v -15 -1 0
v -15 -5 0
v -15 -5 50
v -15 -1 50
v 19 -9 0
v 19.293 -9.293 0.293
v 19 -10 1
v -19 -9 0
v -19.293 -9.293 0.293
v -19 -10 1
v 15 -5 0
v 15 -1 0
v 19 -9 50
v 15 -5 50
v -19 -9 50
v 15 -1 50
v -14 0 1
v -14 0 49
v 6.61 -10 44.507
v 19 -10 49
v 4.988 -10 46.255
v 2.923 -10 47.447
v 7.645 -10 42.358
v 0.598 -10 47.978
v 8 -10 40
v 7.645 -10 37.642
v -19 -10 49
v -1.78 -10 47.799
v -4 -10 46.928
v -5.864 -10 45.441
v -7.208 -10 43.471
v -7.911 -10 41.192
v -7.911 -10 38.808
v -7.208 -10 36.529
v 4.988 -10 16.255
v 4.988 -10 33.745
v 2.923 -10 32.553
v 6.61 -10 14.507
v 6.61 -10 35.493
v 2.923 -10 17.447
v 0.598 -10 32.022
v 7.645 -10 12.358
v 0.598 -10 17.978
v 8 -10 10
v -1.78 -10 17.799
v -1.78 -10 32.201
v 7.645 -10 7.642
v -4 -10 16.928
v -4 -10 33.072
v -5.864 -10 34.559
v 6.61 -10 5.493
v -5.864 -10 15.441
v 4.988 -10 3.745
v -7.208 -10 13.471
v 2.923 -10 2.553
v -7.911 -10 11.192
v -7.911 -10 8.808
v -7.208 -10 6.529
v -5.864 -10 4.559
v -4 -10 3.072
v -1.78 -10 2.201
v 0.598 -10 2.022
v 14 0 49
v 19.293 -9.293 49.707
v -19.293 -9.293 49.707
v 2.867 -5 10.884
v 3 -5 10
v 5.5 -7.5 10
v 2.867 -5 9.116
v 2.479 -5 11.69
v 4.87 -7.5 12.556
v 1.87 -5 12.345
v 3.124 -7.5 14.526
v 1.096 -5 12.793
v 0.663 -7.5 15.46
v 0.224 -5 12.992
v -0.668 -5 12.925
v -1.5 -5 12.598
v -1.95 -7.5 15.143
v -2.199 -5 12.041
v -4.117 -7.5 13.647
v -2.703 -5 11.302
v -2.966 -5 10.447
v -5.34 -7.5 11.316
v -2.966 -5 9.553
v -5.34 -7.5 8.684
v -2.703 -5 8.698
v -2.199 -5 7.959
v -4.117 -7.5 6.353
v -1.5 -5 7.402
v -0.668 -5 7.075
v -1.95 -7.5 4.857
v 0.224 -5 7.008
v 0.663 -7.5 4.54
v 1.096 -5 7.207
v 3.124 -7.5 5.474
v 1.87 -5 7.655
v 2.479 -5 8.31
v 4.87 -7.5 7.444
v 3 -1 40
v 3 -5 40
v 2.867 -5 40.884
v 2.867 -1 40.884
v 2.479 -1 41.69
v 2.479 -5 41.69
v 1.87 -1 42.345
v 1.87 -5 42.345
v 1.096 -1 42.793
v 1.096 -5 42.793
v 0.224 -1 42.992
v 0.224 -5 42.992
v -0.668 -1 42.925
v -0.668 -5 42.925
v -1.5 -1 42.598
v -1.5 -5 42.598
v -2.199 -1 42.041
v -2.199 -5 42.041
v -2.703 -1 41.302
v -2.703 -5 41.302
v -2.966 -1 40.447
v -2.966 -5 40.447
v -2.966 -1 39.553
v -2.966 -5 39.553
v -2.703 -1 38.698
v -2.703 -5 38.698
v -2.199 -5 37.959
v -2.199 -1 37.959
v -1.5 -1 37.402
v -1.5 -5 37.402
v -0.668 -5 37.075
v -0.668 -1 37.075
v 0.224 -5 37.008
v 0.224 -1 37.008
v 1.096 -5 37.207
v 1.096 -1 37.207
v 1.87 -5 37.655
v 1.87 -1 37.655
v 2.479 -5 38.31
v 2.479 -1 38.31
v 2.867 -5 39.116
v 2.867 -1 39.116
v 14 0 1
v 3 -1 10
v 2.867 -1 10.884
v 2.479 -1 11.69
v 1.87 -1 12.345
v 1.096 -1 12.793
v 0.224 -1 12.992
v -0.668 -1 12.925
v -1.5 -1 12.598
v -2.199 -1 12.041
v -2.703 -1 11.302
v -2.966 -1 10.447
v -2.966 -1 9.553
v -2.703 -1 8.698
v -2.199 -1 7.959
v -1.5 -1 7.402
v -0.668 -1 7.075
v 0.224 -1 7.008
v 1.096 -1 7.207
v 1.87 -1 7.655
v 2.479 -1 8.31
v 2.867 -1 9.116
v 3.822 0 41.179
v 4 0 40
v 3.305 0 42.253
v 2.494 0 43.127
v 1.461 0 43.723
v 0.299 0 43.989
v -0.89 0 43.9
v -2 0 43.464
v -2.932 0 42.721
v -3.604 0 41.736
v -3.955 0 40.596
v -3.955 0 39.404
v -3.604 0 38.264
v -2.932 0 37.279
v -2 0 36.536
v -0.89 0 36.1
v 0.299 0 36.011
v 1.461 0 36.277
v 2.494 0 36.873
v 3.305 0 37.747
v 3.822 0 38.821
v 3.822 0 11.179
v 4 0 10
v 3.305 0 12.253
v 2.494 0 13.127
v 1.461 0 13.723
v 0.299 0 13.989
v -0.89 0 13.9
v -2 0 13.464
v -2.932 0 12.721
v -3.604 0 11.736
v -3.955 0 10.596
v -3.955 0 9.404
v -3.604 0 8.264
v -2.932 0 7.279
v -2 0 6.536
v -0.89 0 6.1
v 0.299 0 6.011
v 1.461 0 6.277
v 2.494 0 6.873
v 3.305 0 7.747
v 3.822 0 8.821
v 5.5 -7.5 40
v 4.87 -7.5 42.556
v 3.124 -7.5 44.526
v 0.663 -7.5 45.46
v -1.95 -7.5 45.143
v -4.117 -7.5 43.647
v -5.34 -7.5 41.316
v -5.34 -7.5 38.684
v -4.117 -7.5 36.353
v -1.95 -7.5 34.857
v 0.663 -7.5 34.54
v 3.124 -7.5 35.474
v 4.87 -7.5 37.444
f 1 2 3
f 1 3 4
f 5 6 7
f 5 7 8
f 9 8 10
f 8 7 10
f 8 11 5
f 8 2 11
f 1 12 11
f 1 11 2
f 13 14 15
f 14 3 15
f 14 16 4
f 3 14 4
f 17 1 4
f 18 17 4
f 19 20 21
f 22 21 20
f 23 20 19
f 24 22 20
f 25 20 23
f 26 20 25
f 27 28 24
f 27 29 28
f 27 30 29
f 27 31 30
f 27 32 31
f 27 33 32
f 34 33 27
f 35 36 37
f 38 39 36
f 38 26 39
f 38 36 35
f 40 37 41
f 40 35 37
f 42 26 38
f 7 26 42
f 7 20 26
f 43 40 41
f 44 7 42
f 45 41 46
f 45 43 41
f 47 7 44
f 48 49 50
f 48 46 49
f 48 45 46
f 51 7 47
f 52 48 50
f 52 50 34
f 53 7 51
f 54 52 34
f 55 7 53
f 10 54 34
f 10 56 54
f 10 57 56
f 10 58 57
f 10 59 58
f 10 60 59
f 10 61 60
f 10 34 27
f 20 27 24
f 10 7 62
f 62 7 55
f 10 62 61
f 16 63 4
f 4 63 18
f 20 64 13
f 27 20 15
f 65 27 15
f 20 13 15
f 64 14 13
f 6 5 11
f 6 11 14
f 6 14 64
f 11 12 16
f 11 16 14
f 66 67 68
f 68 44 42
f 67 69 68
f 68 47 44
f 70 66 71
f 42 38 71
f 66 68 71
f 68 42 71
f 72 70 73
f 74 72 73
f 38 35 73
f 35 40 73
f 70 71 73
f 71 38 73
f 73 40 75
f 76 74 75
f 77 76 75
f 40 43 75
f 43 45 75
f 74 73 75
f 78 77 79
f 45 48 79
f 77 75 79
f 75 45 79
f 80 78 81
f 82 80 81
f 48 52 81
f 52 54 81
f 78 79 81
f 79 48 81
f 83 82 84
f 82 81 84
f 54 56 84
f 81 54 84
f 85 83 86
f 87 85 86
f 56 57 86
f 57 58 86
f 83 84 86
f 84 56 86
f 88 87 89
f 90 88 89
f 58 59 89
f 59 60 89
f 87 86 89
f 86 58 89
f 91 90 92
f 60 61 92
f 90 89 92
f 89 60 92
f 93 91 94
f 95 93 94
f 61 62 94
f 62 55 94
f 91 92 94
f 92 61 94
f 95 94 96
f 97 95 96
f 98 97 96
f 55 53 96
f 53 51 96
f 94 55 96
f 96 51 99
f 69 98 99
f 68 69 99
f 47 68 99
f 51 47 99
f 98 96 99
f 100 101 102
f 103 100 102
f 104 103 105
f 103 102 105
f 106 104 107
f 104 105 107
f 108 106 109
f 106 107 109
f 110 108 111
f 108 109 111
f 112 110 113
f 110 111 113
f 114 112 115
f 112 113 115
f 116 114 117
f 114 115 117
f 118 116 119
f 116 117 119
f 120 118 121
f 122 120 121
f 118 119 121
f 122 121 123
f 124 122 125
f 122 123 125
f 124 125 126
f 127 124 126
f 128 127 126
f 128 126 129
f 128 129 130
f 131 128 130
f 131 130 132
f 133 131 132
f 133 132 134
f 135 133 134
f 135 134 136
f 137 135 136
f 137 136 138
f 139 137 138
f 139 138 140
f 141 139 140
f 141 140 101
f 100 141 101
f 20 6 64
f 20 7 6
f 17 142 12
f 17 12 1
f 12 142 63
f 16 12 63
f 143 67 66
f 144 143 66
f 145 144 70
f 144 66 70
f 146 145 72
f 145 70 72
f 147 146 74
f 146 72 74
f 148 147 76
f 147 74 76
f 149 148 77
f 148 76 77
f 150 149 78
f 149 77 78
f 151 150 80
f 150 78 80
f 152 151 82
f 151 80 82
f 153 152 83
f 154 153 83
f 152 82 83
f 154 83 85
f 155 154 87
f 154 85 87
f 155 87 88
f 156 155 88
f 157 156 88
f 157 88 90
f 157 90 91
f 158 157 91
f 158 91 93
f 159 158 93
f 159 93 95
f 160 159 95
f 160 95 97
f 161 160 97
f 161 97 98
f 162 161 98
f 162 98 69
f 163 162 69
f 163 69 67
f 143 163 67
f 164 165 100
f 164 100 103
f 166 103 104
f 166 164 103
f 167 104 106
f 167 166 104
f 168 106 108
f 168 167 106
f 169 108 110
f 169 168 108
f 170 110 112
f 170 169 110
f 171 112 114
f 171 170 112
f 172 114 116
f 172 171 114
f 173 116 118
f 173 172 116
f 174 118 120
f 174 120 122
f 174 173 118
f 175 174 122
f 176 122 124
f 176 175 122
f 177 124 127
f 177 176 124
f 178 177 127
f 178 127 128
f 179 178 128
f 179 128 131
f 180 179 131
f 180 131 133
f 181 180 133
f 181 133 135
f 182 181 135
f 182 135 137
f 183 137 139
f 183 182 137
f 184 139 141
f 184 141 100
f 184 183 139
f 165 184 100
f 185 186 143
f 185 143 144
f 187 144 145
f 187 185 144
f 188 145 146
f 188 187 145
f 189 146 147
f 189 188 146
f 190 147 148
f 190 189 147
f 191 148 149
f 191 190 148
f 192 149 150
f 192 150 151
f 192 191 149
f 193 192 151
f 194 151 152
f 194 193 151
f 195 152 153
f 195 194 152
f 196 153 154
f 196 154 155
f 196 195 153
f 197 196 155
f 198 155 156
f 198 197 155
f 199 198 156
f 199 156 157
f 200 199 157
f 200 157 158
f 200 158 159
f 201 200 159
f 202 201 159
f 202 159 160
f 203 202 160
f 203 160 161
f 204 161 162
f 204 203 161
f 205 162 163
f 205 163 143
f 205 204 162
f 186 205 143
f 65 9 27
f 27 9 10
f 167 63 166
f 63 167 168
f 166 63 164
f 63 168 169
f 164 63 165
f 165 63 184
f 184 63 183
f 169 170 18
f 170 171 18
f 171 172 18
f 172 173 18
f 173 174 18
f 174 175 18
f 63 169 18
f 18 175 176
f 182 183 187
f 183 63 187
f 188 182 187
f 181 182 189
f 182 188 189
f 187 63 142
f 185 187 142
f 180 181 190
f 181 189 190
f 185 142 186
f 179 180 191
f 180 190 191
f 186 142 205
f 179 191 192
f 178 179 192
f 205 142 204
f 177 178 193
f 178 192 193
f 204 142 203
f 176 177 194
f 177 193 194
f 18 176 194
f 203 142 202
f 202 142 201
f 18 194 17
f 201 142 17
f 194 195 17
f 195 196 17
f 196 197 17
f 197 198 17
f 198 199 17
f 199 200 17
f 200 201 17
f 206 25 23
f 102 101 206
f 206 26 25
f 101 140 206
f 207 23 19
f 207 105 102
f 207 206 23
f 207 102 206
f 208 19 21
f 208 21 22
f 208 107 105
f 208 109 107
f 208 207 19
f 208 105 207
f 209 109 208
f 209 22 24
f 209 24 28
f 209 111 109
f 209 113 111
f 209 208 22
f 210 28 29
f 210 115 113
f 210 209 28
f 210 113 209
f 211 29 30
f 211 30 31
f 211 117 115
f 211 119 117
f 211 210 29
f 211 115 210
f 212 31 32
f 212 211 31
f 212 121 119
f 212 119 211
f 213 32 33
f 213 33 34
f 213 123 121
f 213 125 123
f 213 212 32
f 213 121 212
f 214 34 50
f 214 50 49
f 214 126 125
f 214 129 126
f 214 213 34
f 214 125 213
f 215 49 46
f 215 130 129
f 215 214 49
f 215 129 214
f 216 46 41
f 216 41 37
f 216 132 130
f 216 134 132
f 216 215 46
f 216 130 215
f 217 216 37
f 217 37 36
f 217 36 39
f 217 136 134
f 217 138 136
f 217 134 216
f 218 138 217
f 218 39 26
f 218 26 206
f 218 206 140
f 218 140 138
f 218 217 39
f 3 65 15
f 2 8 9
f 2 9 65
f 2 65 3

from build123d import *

# Parameters (mm, degrees)
EXTRUDE_1_DEPTH     = 50
SKETCH_4_R          = 3
CUT_EXTRUDE_1_DEPTH = 50
CHAMFER_1_SIZE      = 5
CHAMFER_2_SIZE      = 5
CHAMFER_4_SIZE      = 1
CHAMFER_5_SIZE      = 1
CHAMFER_6_SIZE      = 1


with BuildPart() as part:
    # 草图2 → 凸台-拉伸1 (new body)
    with BuildSketch(Plane.XY):
        Polygon((0, 0), (15, 0), (15, -5), (20, -10), (-20, -10), (-15, -5), (-15, 0), align=None)
    extrude(amount=EXTRUDE_1_DEPTH)

    # 草图4 → 切除-拉伸1 (cut)
    with BuildSketch(Plane.XZ.offset(10)):
        with Locations((0, 40)):
            Circle(SKETCH_4_R)
        with Locations((0, 10)):
            Circle(SKETCH_4_R)
    extrude(amount=-CUT_EXTRUDE_1_DEPTH, mode=Mode.SUBTRACT)

    # 倒角1
    chamfer_1_edges = [part.edges().sort_by_distance(p)[0] for p in [
        (-3, -10, 10),
    ]]
    chamfer(chamfer_1_edges, length=CHAMFER_1_SIZE)

    # 倒角2
    chamfer_2_edges = [part.edges().sort_by_distance(p)[0] for p in [
        (-3, -10, 40),
    ]]
    chamfer(chamfer_2_edges, length=CHAMFER_2_SIZE)

    # 倒角4
    chamfer_4_edges = [part.edges().sort_by_distance(p)[0] for p in [
        (15, 0, 25),
        (-15, 0, 25),
        (-3, 0, 40),
        (-3, 0, 10),
        (0, 0, 50),
        (0, 0, 0),
    ]]
    chamfer(chamfer_4_edges, length=CHAMFER_4_SIZE)

    # 倒角5
    chamfer_5_edges = [part.edges().sort_by_distance(p)[0] for p in [
        (20, -10, 25),
        (-20, -10, 25),
    ]]
    chamfer(chamfer_5_edges, length=CHAMFER_5_SIZE)

    # 倒角6
    chamfer_6_edges = [part.edges().sort_by_distance(p)[0] for p in [
        (0, -10, 0),
        (0, -10, 50),
    ]]
    chamfer(chamfer_6_edges, length=CHAMFER_6_SIZE)


solid = part.part
